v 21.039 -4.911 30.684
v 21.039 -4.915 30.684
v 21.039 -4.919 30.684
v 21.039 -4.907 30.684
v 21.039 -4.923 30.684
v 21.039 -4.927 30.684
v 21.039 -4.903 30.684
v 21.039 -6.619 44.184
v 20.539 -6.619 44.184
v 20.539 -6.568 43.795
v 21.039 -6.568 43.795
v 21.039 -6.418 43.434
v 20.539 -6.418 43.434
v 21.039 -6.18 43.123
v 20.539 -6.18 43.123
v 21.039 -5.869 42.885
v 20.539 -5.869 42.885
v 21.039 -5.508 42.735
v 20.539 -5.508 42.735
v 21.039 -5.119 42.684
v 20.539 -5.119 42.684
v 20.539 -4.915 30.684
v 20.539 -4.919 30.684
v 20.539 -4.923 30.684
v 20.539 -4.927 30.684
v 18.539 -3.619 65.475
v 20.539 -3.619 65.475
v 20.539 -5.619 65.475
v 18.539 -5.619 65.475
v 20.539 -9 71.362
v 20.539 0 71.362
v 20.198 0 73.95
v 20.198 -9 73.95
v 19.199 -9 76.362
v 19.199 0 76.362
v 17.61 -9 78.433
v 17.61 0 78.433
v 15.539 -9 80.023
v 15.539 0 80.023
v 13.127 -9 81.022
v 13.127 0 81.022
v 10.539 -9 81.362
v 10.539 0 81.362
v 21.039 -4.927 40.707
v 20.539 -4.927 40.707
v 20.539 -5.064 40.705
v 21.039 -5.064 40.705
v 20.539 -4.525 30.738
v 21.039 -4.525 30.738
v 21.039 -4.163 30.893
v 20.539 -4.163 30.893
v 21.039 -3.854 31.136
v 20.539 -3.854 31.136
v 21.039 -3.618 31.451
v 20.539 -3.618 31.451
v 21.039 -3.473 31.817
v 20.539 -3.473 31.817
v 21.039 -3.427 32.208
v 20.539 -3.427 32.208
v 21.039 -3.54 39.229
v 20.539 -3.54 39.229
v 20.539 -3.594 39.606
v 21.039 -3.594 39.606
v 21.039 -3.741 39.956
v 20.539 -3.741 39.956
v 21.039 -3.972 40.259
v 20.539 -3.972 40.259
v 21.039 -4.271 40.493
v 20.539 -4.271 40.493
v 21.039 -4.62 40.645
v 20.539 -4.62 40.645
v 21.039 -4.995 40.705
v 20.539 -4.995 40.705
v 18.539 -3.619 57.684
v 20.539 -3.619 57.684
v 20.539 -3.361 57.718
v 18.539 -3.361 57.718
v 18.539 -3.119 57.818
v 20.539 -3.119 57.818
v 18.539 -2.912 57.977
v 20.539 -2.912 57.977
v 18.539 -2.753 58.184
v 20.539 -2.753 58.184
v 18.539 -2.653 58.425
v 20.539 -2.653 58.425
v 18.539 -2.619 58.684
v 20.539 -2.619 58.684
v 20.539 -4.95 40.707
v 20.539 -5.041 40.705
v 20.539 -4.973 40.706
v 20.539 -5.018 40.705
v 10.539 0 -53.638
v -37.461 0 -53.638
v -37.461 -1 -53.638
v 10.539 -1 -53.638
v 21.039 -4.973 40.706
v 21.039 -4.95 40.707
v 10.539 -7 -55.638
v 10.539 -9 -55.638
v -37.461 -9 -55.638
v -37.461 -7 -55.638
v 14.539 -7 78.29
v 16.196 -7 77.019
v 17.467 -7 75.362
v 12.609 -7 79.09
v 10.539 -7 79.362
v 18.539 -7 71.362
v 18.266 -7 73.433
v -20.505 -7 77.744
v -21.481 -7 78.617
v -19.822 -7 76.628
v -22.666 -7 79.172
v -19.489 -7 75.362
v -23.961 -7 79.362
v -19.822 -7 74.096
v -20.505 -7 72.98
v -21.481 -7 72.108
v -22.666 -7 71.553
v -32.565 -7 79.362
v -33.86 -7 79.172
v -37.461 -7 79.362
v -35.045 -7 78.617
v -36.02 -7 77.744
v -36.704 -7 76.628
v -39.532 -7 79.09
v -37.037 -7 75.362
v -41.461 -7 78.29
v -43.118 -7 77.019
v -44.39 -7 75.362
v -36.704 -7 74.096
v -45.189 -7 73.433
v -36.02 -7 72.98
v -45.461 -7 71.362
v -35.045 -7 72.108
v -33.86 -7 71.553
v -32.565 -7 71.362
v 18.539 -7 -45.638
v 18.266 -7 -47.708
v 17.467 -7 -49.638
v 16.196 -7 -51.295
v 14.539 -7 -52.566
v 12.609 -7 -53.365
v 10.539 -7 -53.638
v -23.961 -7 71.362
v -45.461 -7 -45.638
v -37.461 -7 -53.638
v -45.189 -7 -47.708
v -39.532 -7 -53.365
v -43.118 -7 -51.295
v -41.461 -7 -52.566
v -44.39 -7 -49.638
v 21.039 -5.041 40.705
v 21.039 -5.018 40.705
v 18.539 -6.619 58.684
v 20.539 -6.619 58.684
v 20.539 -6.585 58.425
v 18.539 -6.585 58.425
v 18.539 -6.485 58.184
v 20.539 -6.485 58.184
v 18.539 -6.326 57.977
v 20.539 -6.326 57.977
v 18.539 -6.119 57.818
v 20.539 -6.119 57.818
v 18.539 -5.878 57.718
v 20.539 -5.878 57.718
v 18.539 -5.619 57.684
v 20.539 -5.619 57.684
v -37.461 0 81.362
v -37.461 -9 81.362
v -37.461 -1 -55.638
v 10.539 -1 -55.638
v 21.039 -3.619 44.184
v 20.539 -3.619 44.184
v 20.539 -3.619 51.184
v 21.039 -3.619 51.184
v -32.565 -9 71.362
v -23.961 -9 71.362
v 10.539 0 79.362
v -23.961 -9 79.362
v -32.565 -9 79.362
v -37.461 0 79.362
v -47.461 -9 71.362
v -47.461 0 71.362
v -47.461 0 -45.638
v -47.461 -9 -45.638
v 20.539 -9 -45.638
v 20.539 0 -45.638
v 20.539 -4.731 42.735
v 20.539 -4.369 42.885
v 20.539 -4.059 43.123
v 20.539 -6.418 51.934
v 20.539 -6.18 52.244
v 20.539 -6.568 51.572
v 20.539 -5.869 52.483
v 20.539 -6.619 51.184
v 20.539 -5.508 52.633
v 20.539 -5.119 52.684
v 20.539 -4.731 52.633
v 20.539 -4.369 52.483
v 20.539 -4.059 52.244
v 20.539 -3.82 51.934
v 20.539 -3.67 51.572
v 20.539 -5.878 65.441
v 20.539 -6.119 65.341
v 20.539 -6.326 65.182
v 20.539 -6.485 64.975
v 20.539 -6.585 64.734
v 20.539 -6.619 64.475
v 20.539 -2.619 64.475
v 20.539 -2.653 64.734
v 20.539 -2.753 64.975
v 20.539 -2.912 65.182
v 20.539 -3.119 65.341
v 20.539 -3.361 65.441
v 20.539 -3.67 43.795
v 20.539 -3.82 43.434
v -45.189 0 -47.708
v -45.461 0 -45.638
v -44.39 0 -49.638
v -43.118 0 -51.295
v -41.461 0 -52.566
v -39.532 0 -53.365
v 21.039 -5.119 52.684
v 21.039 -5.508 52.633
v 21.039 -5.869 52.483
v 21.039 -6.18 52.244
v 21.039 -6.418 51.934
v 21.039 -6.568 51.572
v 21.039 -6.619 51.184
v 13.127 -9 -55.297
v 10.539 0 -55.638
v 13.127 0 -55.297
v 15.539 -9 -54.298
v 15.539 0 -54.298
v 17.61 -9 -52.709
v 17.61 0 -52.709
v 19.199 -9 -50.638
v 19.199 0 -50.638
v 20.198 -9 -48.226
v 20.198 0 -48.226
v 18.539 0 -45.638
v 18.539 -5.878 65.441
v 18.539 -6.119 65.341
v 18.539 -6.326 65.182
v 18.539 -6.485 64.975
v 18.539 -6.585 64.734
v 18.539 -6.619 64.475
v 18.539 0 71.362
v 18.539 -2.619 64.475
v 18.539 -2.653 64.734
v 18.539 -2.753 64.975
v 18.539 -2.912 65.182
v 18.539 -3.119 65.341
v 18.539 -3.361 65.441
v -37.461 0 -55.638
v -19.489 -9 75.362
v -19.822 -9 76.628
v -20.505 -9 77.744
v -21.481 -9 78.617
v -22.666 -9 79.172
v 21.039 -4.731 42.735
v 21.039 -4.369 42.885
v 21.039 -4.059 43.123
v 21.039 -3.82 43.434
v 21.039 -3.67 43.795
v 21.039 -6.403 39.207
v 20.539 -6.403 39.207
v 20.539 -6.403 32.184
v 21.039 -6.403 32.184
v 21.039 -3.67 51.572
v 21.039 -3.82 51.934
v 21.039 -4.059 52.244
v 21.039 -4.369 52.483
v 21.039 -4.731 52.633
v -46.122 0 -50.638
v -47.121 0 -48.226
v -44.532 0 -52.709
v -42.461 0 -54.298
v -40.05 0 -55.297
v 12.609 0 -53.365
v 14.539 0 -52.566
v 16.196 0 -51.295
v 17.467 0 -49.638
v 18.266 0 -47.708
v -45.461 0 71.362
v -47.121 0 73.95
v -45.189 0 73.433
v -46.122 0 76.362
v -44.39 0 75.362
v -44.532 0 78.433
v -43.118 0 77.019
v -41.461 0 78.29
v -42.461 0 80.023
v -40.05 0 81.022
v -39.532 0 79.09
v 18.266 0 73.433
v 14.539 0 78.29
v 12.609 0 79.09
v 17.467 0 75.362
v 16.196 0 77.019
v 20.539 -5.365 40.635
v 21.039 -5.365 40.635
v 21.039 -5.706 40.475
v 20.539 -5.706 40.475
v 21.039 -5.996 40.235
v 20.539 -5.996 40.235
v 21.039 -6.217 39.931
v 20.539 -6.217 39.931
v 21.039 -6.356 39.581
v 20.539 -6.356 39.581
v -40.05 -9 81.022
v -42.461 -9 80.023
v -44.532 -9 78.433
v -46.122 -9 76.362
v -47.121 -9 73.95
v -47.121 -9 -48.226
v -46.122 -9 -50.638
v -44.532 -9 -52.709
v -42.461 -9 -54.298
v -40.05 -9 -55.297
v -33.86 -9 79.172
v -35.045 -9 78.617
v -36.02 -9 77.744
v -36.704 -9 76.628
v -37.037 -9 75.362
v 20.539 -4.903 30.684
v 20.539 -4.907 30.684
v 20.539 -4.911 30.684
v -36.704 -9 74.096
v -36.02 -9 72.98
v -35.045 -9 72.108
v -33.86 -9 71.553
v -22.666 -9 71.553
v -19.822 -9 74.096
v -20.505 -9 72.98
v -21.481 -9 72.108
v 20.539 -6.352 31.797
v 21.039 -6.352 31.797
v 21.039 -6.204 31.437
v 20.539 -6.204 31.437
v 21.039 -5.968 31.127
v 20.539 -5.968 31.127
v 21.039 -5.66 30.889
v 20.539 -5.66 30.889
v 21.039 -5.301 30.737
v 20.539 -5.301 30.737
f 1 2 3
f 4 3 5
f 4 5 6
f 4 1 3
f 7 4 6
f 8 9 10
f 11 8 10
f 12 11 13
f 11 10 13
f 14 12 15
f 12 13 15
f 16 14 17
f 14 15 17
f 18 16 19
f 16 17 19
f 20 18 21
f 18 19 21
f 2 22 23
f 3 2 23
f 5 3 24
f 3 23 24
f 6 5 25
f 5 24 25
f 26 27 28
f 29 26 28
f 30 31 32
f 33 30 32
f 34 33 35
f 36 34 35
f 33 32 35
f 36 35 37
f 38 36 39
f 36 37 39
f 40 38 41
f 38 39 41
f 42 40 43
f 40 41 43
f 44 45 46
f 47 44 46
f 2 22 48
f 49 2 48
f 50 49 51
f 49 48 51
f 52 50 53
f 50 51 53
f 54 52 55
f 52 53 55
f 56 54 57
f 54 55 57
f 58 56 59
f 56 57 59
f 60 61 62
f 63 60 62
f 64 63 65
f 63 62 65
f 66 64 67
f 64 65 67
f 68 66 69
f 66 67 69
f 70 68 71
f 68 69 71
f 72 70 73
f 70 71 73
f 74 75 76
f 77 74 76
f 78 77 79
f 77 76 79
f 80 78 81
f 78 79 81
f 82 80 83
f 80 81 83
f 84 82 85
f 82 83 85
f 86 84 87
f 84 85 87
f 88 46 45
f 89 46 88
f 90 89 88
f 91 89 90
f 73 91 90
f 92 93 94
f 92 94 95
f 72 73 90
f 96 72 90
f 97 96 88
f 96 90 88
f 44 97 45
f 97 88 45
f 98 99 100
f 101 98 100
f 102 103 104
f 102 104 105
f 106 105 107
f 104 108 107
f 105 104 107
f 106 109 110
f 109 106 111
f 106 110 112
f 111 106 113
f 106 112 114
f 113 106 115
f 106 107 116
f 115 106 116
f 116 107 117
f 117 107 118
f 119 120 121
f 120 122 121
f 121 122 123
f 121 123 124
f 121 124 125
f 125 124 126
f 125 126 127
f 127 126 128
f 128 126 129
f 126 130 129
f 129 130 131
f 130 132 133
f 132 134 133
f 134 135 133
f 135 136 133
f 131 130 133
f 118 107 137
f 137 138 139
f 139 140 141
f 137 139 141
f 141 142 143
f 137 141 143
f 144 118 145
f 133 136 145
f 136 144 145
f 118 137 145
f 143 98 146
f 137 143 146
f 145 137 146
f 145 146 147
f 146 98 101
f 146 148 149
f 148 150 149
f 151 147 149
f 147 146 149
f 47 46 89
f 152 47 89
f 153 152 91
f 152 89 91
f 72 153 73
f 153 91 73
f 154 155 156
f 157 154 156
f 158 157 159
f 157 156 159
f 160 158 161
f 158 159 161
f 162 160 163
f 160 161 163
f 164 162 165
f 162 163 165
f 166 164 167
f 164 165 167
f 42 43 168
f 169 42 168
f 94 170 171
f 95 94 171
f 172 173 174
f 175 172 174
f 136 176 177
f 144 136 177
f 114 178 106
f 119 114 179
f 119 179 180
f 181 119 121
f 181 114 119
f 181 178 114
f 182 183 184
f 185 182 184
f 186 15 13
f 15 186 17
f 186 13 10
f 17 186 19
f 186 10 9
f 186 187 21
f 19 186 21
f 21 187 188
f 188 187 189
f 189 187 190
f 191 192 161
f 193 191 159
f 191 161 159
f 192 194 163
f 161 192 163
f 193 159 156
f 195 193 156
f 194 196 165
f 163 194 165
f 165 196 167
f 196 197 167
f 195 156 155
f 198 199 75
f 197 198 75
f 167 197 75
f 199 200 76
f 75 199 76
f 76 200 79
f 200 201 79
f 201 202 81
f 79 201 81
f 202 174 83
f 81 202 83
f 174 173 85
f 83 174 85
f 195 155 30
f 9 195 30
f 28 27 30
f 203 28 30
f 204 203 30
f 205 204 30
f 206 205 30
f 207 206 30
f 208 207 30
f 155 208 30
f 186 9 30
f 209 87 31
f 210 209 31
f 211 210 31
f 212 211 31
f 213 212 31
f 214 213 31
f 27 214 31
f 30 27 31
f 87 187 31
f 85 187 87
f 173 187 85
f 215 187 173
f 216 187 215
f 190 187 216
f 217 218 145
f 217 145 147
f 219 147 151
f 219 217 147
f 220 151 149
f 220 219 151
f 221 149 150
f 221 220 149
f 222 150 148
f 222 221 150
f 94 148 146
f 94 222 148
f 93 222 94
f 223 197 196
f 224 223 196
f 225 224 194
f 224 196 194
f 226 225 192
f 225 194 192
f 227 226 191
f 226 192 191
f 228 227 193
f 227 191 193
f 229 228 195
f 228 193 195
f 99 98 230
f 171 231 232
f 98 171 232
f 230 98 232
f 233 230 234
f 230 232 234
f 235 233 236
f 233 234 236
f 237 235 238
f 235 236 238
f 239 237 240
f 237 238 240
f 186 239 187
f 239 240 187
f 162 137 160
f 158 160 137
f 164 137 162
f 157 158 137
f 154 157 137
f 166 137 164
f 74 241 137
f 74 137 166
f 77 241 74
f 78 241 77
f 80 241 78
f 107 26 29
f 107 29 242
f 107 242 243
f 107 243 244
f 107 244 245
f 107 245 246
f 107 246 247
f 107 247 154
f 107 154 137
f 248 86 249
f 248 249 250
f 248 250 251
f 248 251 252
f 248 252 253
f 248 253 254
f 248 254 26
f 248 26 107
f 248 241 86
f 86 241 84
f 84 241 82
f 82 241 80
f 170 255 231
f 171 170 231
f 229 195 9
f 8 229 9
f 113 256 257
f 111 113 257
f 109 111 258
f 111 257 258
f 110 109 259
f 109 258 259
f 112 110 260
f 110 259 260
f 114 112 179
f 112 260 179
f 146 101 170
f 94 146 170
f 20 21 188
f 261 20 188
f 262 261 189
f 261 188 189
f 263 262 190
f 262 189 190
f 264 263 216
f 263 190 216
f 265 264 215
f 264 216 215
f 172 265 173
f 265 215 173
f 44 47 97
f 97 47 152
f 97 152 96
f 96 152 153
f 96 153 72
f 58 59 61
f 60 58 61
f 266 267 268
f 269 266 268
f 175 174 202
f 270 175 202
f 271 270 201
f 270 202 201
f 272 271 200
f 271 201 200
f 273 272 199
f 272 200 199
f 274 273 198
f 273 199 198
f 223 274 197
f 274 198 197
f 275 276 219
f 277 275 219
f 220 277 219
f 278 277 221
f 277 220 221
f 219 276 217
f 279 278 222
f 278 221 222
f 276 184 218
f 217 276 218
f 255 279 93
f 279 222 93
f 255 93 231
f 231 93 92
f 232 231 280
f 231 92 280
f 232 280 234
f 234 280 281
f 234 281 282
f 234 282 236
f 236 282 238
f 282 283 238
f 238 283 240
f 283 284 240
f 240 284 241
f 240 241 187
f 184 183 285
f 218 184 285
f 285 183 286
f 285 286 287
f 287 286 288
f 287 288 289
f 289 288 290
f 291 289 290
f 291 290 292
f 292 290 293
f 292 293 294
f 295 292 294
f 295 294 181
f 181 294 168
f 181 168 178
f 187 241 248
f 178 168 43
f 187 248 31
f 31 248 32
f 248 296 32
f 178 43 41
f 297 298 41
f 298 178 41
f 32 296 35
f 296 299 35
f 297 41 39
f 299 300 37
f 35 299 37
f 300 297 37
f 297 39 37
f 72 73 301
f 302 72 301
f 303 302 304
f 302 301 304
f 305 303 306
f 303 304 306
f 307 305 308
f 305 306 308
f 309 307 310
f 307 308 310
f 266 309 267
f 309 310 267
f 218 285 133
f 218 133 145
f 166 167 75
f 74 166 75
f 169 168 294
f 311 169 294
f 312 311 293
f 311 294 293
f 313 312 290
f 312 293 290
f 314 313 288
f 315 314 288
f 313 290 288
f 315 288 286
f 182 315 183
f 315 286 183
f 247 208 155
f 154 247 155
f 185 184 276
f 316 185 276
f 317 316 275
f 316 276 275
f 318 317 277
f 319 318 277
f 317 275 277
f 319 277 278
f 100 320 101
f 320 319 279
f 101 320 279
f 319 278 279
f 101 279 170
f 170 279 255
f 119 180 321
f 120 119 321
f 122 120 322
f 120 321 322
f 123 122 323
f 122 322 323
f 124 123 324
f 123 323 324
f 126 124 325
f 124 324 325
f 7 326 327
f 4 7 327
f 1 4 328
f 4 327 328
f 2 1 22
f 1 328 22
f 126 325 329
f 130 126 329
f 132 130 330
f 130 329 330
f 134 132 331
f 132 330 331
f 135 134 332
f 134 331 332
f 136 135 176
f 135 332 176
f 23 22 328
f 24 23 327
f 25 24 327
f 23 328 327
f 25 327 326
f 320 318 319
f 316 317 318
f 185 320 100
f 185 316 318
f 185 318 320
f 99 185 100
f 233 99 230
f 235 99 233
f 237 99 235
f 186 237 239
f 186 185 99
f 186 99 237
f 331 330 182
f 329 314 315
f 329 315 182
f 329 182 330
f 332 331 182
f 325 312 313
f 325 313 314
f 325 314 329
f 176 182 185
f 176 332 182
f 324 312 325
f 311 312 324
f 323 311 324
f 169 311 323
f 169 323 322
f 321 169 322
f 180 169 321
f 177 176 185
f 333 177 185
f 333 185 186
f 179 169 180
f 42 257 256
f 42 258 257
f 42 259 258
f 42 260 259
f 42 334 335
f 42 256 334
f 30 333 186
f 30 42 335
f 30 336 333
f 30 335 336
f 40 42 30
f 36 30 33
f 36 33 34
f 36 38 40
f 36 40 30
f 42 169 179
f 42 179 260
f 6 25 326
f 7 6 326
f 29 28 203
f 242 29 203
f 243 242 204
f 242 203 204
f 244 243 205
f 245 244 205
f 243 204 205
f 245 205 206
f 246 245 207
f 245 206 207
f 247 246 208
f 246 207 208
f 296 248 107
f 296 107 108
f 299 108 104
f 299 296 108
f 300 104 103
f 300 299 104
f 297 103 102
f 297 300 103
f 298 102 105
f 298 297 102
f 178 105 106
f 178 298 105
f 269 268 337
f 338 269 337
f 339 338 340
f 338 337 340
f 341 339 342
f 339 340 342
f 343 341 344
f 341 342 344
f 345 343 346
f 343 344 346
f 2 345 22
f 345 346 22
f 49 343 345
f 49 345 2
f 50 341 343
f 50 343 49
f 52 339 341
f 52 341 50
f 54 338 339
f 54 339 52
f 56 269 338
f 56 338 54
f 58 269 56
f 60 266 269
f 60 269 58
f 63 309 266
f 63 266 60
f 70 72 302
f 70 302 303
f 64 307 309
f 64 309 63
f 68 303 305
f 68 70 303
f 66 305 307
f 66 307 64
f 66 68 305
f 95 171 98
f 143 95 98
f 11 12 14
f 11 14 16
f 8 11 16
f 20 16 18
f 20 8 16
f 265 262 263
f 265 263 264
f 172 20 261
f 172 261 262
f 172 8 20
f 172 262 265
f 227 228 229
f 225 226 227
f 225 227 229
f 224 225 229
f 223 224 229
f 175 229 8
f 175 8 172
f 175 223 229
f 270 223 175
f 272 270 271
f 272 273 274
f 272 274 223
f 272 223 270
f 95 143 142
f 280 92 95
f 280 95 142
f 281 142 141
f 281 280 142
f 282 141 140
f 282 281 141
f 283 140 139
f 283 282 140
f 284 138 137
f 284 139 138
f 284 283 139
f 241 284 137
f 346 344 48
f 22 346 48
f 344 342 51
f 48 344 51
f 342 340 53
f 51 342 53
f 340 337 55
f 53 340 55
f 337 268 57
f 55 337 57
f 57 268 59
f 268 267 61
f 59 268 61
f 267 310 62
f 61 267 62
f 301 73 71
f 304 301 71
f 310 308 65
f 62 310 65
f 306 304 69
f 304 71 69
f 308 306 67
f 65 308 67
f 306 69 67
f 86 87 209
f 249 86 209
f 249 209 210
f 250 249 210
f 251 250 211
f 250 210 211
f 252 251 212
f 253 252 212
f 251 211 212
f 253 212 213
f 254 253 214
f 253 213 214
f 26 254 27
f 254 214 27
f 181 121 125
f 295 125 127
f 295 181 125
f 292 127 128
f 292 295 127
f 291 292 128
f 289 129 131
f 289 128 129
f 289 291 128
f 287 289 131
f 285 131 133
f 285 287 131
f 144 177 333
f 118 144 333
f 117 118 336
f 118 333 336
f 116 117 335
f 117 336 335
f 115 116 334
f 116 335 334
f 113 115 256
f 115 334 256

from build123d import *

# Parameters (mm, degrees)
F1_DEPTH  = 9
F2_T      = -2
F4_DEPTH  = 9.001
F6_DEPTH  = 25
F7_DEPTH  = 25
F8_DEPTH  = 1
F10_DEPTH = 25
F12_DEPTH = 0.5
F14_DEPTH = 0.5


with BuildPart() as f1:
    # F0 (on Front) → F1 (new body)
    with BuildSketch(Plane.XZ):
        with BuildLine():
            Line((20.5386653927, -45.6377468854), (20.5386653927, 71.3622531146))
            ThreePointArc((20.5386653927, 71.3622531146), (17.6097332046, 78.4333209264), (10.5386653927, 81.3622531146))
            Line((10.5386653927, 81.3622531146), (-37.4613346073, 81.3622531146))
            ThreePointArc((-37.4613346073, 81.3622531146), (-44.5324024191, 78.4333209264), (-47.4613346073, 71.3622531146))
            Line((-47.4613346073, 71.3622531146), (-47.4613346073, -45.6377468854))
            ThreePointArc((-47.4613346073, -45.6377468854), (-44.5324024191, -52.7088146973), (-37.4613346073, -55.6377468854))
            Line((-37.4613346073, -55.6377468854), (10.5386653927, -55.6377468854))
            ThreePointArc((10.5386653927, -55.6377468854), (17.6097332046, -52.7088146973), (20.5386653927, -45.6377468854))
        make_face()
    extrude(amount=F1_DEPTH)

    # F2
    f2_openings = [f1.faces().sort_by_distance(p)[0] for p in [
        (-13.461335, 0, 12.862253),
    ]]
    offset(amount=F2_T, openings=f2_openings)

    # F3 (on face) → F4 (cut, through all)
    with BuildSketch(Plane.XZ.offset(9)):
        with BuildLine():
            ThreePointArc((-32.564605879, 79.3622531146), (-35.564605879, 78.2163550808), (-37.036741834, 75.3622531146))
            ThreePointArc((-37.036741834, 75.3622531146), (-35.564605879, 72.5081511483), (-32.564605879, 71.3622531146))
            Line((-32.564605879, 71.3622531146), (-23.9613346073, 71.3622531146))
            ThreePointArc((-23.9613346073, 71.3622531146), (-20.9613346073, 72.5081511483), (-19.4891986523, 75.3622531146))
            ThreePointArc((-19.4891986523, 75.3622531146), (-20.9613346073, 78.2163550808), (-23.9613346073, 79.3622531146))
            Line((-23.9613346073, 79.3622531146), (-32.564605879, 79.3622531146))
        make_face()
    extrude(amount=-F4_DEPTH, mode=Mode.SUBTRACT)

    # F5 (on face) → F6 (cut)
    with BuildSketch(Plane(origin=(0, 0, -55.6377468854), x_dir=(1, 0, 0), z_dir=(0, 0, -1))):
        Polygon((-37.4613346073, 8), (-37.4613346073, 1), (-32.577522099, 1), (10.5386653927, 1), (10.5386653927, 8), (-32.6389931142, 8), align=None)
    extrude(amount=F6_DEPTH, mode=Mode.SUBTRACT)

    # F5 (on face) → F7 (cut)
    with BuildSketch(Plane(origin=(0, 0, -55.6377468854), x_dir=(1, 0, 0), z_dir=(0, 0, -1))):
        Polygon((-37.4613346073, 8), (-37.4613346073, 1), (-32.577522099, 1), (10.5386653927, 1), (10.5386653927, 8), (-32.6389931142, 8), align=None)
    extrude(amount=-F7_DEPTH, mode=Mode.SUBTRACT)

    # F8 (add): a face of the model
    f8_faces = [f1.faces().sort_by_distance(p)[0] for p in [
        (-13.4613346073, -8, -43.1377468854),
    ]]
    extrude(f8_faces, amount=F8_DEPTH)

    # F9 (on face) → F10 (cut)
    with BuildSketch(Plane.YZ.offset(20.5386653927)):
        with BuildLine():
            Line((-5.6193663515, 57.6836162011), (-4.6193663515, 57.6836162011))
            Line((-4.6193663515, 57.6836162011), (-3.6193663515, 57.6836162011))
            ThreePointArc((-3.6193663515, 57.6836162011), (-2.9122595703, 57.9765094199), (-2.6193663515, 58.6836162011))
            Line((-2.6193663515, 58.6836162011), (-2.6193663515, 64.4752531146))
            ThreePointArc((-2.6193663515, 64.4752531146), (-2.9122595703, 65.1823598958), (-3.6193663515, 65.4752531146))
            Line((-3.6193663515, 65.4752531146), (-4.6193663515, 65.4752531146))
            Line((-4.6193663515, 65.4752531146), (-5.6193663515, 65.4752531146))
            ThreePointArc((-5.6193663515, 65.4752531146), (-6.3264731327, 65.1823598958), (-6.6193663515, 64.4752531146))
            Line((-6.6193663515, 64.4752531146), (-6.6193663515, 58.6836162011))
            ThreePointArc((-6.6193663515, 58.6836162011), (-6.3264731327, 57.9765094199), (-5.6193663515, 57.6836162011))
        make_face()
    extrude(amount=-F10_DEPTH, mode=Mode.SUBTRACT)

    # F11 (on face) → F12 (join)
    with BuildSketch(Plane.YZ.offset(20.5386653927)):
        with BuildLine():
            Line((-3.6193663515, 44.1836162011), (-3.6193663515, 51.1836162011))
            ThreePointArc((-3.6193663515, 51.1836162011), (-4.0587061797, 52.2442763729), (-5.1193663515, 52.6836162011))
            ThreePointArc((-5.1193663515, 52.6836162011), (-6.1800265233, 52.2442763729), (-6.6193663515, 51.1836162011))
            Line((-6.6193663515, 51.1836162011), (-6.6193663515, 44.1836162011))
            ThreePointArc((-6.6193663515, 44.1836162011), (-6.1800265233, 43.1229560293), (-5.1193663515, 42.6836162011))
            ThreePointArc((-5.1193663515, 42.6836162011), (-4.0587061797, 43.1229560293), (-3.6193663515, 44.1836162011))
        make_face()
    extrude(amount=F12_DEPTH)


with BuildPart() as f14:
    # F13 (on face) → F14 (new body)
    with BuildSketch(Plane.YZ.offset(20.5386653927)):
        with BuildLine():
            ThreePointArc((-5.0636678894, 40.7050617311), (-5.0294926963, 40.70521957), (-4.9953227773, 40.7045987809))
            ThreePointArc((-4.9953227773, 40.7045987809), (-4.9611902501, 40.7063132258), (-4.927027523, 40.7072496107))
            Line((-4.927027523, 40.7072496107), (-5.0636678894, 40.7050617311))
        make_face()
    extrude(amount=F14_DEPTH)


with BuildPart() as f14b:
    # F13 (on face) → F14, piece 2 (new body)
    with BuildSketch(Plane.YZ.offset(20.5386653927)):
        with BuildLine():
            ThreePointArc((-4.9030126669, 30.6836162011), (-4.9090652684, 30.6836284125), (-4.9151177714, 30.6836650464))
            ThreePointArc((-4.9151177714, 30.6836650464), (-4.9211702745, 30.6836284125), (-4.927222876, 30.6836162011))
            Line((-4.927222876, 30.6836162011), (-4.9030126669, 30.6836162011))
        make_face()
    extrude(amount=F14_DEPTH)


with BuildPart() as f14c:
    # F13 (on face) → F14, piece 3 (new body)
    with BuildSketch(Plane.YZ.offset(20.5386653927)):
        with BuildLine():
            Line((-6.4030126669, 39.2074418608), (-6.4030126669, 32.1836162011))
            ThreePointArc((-6.4030126669, 32.1836162011), (-5.9679440395, 31.1272444997), (-4.9151177714, 30.6836650464))
            ThreePointArc((-4.9151177714, 30.6836650464), (-3.8538691503, 31.1358033459), (-3.4274151261, 32.2076310572))
            Line((-3.4274151261, 32.2076310572), (-3.5398452833, 39.2292688374))
            ThreePointArc((-3.5398452833, 39.2292688374), (-3.9718327507, 40.2587053774), (-4.9953227773, 40.7045987809))
            ThreePointArc((-4.9953227773, 40.7045987809), (-5.9958221575, 40.2349472949), (-6.4030126669, 39.2074418608))
        make_face()
    extrude(amount=F14_DEPTH)


solid = Compound([f1.part, f14.part, f14b.part, f14c.part])
